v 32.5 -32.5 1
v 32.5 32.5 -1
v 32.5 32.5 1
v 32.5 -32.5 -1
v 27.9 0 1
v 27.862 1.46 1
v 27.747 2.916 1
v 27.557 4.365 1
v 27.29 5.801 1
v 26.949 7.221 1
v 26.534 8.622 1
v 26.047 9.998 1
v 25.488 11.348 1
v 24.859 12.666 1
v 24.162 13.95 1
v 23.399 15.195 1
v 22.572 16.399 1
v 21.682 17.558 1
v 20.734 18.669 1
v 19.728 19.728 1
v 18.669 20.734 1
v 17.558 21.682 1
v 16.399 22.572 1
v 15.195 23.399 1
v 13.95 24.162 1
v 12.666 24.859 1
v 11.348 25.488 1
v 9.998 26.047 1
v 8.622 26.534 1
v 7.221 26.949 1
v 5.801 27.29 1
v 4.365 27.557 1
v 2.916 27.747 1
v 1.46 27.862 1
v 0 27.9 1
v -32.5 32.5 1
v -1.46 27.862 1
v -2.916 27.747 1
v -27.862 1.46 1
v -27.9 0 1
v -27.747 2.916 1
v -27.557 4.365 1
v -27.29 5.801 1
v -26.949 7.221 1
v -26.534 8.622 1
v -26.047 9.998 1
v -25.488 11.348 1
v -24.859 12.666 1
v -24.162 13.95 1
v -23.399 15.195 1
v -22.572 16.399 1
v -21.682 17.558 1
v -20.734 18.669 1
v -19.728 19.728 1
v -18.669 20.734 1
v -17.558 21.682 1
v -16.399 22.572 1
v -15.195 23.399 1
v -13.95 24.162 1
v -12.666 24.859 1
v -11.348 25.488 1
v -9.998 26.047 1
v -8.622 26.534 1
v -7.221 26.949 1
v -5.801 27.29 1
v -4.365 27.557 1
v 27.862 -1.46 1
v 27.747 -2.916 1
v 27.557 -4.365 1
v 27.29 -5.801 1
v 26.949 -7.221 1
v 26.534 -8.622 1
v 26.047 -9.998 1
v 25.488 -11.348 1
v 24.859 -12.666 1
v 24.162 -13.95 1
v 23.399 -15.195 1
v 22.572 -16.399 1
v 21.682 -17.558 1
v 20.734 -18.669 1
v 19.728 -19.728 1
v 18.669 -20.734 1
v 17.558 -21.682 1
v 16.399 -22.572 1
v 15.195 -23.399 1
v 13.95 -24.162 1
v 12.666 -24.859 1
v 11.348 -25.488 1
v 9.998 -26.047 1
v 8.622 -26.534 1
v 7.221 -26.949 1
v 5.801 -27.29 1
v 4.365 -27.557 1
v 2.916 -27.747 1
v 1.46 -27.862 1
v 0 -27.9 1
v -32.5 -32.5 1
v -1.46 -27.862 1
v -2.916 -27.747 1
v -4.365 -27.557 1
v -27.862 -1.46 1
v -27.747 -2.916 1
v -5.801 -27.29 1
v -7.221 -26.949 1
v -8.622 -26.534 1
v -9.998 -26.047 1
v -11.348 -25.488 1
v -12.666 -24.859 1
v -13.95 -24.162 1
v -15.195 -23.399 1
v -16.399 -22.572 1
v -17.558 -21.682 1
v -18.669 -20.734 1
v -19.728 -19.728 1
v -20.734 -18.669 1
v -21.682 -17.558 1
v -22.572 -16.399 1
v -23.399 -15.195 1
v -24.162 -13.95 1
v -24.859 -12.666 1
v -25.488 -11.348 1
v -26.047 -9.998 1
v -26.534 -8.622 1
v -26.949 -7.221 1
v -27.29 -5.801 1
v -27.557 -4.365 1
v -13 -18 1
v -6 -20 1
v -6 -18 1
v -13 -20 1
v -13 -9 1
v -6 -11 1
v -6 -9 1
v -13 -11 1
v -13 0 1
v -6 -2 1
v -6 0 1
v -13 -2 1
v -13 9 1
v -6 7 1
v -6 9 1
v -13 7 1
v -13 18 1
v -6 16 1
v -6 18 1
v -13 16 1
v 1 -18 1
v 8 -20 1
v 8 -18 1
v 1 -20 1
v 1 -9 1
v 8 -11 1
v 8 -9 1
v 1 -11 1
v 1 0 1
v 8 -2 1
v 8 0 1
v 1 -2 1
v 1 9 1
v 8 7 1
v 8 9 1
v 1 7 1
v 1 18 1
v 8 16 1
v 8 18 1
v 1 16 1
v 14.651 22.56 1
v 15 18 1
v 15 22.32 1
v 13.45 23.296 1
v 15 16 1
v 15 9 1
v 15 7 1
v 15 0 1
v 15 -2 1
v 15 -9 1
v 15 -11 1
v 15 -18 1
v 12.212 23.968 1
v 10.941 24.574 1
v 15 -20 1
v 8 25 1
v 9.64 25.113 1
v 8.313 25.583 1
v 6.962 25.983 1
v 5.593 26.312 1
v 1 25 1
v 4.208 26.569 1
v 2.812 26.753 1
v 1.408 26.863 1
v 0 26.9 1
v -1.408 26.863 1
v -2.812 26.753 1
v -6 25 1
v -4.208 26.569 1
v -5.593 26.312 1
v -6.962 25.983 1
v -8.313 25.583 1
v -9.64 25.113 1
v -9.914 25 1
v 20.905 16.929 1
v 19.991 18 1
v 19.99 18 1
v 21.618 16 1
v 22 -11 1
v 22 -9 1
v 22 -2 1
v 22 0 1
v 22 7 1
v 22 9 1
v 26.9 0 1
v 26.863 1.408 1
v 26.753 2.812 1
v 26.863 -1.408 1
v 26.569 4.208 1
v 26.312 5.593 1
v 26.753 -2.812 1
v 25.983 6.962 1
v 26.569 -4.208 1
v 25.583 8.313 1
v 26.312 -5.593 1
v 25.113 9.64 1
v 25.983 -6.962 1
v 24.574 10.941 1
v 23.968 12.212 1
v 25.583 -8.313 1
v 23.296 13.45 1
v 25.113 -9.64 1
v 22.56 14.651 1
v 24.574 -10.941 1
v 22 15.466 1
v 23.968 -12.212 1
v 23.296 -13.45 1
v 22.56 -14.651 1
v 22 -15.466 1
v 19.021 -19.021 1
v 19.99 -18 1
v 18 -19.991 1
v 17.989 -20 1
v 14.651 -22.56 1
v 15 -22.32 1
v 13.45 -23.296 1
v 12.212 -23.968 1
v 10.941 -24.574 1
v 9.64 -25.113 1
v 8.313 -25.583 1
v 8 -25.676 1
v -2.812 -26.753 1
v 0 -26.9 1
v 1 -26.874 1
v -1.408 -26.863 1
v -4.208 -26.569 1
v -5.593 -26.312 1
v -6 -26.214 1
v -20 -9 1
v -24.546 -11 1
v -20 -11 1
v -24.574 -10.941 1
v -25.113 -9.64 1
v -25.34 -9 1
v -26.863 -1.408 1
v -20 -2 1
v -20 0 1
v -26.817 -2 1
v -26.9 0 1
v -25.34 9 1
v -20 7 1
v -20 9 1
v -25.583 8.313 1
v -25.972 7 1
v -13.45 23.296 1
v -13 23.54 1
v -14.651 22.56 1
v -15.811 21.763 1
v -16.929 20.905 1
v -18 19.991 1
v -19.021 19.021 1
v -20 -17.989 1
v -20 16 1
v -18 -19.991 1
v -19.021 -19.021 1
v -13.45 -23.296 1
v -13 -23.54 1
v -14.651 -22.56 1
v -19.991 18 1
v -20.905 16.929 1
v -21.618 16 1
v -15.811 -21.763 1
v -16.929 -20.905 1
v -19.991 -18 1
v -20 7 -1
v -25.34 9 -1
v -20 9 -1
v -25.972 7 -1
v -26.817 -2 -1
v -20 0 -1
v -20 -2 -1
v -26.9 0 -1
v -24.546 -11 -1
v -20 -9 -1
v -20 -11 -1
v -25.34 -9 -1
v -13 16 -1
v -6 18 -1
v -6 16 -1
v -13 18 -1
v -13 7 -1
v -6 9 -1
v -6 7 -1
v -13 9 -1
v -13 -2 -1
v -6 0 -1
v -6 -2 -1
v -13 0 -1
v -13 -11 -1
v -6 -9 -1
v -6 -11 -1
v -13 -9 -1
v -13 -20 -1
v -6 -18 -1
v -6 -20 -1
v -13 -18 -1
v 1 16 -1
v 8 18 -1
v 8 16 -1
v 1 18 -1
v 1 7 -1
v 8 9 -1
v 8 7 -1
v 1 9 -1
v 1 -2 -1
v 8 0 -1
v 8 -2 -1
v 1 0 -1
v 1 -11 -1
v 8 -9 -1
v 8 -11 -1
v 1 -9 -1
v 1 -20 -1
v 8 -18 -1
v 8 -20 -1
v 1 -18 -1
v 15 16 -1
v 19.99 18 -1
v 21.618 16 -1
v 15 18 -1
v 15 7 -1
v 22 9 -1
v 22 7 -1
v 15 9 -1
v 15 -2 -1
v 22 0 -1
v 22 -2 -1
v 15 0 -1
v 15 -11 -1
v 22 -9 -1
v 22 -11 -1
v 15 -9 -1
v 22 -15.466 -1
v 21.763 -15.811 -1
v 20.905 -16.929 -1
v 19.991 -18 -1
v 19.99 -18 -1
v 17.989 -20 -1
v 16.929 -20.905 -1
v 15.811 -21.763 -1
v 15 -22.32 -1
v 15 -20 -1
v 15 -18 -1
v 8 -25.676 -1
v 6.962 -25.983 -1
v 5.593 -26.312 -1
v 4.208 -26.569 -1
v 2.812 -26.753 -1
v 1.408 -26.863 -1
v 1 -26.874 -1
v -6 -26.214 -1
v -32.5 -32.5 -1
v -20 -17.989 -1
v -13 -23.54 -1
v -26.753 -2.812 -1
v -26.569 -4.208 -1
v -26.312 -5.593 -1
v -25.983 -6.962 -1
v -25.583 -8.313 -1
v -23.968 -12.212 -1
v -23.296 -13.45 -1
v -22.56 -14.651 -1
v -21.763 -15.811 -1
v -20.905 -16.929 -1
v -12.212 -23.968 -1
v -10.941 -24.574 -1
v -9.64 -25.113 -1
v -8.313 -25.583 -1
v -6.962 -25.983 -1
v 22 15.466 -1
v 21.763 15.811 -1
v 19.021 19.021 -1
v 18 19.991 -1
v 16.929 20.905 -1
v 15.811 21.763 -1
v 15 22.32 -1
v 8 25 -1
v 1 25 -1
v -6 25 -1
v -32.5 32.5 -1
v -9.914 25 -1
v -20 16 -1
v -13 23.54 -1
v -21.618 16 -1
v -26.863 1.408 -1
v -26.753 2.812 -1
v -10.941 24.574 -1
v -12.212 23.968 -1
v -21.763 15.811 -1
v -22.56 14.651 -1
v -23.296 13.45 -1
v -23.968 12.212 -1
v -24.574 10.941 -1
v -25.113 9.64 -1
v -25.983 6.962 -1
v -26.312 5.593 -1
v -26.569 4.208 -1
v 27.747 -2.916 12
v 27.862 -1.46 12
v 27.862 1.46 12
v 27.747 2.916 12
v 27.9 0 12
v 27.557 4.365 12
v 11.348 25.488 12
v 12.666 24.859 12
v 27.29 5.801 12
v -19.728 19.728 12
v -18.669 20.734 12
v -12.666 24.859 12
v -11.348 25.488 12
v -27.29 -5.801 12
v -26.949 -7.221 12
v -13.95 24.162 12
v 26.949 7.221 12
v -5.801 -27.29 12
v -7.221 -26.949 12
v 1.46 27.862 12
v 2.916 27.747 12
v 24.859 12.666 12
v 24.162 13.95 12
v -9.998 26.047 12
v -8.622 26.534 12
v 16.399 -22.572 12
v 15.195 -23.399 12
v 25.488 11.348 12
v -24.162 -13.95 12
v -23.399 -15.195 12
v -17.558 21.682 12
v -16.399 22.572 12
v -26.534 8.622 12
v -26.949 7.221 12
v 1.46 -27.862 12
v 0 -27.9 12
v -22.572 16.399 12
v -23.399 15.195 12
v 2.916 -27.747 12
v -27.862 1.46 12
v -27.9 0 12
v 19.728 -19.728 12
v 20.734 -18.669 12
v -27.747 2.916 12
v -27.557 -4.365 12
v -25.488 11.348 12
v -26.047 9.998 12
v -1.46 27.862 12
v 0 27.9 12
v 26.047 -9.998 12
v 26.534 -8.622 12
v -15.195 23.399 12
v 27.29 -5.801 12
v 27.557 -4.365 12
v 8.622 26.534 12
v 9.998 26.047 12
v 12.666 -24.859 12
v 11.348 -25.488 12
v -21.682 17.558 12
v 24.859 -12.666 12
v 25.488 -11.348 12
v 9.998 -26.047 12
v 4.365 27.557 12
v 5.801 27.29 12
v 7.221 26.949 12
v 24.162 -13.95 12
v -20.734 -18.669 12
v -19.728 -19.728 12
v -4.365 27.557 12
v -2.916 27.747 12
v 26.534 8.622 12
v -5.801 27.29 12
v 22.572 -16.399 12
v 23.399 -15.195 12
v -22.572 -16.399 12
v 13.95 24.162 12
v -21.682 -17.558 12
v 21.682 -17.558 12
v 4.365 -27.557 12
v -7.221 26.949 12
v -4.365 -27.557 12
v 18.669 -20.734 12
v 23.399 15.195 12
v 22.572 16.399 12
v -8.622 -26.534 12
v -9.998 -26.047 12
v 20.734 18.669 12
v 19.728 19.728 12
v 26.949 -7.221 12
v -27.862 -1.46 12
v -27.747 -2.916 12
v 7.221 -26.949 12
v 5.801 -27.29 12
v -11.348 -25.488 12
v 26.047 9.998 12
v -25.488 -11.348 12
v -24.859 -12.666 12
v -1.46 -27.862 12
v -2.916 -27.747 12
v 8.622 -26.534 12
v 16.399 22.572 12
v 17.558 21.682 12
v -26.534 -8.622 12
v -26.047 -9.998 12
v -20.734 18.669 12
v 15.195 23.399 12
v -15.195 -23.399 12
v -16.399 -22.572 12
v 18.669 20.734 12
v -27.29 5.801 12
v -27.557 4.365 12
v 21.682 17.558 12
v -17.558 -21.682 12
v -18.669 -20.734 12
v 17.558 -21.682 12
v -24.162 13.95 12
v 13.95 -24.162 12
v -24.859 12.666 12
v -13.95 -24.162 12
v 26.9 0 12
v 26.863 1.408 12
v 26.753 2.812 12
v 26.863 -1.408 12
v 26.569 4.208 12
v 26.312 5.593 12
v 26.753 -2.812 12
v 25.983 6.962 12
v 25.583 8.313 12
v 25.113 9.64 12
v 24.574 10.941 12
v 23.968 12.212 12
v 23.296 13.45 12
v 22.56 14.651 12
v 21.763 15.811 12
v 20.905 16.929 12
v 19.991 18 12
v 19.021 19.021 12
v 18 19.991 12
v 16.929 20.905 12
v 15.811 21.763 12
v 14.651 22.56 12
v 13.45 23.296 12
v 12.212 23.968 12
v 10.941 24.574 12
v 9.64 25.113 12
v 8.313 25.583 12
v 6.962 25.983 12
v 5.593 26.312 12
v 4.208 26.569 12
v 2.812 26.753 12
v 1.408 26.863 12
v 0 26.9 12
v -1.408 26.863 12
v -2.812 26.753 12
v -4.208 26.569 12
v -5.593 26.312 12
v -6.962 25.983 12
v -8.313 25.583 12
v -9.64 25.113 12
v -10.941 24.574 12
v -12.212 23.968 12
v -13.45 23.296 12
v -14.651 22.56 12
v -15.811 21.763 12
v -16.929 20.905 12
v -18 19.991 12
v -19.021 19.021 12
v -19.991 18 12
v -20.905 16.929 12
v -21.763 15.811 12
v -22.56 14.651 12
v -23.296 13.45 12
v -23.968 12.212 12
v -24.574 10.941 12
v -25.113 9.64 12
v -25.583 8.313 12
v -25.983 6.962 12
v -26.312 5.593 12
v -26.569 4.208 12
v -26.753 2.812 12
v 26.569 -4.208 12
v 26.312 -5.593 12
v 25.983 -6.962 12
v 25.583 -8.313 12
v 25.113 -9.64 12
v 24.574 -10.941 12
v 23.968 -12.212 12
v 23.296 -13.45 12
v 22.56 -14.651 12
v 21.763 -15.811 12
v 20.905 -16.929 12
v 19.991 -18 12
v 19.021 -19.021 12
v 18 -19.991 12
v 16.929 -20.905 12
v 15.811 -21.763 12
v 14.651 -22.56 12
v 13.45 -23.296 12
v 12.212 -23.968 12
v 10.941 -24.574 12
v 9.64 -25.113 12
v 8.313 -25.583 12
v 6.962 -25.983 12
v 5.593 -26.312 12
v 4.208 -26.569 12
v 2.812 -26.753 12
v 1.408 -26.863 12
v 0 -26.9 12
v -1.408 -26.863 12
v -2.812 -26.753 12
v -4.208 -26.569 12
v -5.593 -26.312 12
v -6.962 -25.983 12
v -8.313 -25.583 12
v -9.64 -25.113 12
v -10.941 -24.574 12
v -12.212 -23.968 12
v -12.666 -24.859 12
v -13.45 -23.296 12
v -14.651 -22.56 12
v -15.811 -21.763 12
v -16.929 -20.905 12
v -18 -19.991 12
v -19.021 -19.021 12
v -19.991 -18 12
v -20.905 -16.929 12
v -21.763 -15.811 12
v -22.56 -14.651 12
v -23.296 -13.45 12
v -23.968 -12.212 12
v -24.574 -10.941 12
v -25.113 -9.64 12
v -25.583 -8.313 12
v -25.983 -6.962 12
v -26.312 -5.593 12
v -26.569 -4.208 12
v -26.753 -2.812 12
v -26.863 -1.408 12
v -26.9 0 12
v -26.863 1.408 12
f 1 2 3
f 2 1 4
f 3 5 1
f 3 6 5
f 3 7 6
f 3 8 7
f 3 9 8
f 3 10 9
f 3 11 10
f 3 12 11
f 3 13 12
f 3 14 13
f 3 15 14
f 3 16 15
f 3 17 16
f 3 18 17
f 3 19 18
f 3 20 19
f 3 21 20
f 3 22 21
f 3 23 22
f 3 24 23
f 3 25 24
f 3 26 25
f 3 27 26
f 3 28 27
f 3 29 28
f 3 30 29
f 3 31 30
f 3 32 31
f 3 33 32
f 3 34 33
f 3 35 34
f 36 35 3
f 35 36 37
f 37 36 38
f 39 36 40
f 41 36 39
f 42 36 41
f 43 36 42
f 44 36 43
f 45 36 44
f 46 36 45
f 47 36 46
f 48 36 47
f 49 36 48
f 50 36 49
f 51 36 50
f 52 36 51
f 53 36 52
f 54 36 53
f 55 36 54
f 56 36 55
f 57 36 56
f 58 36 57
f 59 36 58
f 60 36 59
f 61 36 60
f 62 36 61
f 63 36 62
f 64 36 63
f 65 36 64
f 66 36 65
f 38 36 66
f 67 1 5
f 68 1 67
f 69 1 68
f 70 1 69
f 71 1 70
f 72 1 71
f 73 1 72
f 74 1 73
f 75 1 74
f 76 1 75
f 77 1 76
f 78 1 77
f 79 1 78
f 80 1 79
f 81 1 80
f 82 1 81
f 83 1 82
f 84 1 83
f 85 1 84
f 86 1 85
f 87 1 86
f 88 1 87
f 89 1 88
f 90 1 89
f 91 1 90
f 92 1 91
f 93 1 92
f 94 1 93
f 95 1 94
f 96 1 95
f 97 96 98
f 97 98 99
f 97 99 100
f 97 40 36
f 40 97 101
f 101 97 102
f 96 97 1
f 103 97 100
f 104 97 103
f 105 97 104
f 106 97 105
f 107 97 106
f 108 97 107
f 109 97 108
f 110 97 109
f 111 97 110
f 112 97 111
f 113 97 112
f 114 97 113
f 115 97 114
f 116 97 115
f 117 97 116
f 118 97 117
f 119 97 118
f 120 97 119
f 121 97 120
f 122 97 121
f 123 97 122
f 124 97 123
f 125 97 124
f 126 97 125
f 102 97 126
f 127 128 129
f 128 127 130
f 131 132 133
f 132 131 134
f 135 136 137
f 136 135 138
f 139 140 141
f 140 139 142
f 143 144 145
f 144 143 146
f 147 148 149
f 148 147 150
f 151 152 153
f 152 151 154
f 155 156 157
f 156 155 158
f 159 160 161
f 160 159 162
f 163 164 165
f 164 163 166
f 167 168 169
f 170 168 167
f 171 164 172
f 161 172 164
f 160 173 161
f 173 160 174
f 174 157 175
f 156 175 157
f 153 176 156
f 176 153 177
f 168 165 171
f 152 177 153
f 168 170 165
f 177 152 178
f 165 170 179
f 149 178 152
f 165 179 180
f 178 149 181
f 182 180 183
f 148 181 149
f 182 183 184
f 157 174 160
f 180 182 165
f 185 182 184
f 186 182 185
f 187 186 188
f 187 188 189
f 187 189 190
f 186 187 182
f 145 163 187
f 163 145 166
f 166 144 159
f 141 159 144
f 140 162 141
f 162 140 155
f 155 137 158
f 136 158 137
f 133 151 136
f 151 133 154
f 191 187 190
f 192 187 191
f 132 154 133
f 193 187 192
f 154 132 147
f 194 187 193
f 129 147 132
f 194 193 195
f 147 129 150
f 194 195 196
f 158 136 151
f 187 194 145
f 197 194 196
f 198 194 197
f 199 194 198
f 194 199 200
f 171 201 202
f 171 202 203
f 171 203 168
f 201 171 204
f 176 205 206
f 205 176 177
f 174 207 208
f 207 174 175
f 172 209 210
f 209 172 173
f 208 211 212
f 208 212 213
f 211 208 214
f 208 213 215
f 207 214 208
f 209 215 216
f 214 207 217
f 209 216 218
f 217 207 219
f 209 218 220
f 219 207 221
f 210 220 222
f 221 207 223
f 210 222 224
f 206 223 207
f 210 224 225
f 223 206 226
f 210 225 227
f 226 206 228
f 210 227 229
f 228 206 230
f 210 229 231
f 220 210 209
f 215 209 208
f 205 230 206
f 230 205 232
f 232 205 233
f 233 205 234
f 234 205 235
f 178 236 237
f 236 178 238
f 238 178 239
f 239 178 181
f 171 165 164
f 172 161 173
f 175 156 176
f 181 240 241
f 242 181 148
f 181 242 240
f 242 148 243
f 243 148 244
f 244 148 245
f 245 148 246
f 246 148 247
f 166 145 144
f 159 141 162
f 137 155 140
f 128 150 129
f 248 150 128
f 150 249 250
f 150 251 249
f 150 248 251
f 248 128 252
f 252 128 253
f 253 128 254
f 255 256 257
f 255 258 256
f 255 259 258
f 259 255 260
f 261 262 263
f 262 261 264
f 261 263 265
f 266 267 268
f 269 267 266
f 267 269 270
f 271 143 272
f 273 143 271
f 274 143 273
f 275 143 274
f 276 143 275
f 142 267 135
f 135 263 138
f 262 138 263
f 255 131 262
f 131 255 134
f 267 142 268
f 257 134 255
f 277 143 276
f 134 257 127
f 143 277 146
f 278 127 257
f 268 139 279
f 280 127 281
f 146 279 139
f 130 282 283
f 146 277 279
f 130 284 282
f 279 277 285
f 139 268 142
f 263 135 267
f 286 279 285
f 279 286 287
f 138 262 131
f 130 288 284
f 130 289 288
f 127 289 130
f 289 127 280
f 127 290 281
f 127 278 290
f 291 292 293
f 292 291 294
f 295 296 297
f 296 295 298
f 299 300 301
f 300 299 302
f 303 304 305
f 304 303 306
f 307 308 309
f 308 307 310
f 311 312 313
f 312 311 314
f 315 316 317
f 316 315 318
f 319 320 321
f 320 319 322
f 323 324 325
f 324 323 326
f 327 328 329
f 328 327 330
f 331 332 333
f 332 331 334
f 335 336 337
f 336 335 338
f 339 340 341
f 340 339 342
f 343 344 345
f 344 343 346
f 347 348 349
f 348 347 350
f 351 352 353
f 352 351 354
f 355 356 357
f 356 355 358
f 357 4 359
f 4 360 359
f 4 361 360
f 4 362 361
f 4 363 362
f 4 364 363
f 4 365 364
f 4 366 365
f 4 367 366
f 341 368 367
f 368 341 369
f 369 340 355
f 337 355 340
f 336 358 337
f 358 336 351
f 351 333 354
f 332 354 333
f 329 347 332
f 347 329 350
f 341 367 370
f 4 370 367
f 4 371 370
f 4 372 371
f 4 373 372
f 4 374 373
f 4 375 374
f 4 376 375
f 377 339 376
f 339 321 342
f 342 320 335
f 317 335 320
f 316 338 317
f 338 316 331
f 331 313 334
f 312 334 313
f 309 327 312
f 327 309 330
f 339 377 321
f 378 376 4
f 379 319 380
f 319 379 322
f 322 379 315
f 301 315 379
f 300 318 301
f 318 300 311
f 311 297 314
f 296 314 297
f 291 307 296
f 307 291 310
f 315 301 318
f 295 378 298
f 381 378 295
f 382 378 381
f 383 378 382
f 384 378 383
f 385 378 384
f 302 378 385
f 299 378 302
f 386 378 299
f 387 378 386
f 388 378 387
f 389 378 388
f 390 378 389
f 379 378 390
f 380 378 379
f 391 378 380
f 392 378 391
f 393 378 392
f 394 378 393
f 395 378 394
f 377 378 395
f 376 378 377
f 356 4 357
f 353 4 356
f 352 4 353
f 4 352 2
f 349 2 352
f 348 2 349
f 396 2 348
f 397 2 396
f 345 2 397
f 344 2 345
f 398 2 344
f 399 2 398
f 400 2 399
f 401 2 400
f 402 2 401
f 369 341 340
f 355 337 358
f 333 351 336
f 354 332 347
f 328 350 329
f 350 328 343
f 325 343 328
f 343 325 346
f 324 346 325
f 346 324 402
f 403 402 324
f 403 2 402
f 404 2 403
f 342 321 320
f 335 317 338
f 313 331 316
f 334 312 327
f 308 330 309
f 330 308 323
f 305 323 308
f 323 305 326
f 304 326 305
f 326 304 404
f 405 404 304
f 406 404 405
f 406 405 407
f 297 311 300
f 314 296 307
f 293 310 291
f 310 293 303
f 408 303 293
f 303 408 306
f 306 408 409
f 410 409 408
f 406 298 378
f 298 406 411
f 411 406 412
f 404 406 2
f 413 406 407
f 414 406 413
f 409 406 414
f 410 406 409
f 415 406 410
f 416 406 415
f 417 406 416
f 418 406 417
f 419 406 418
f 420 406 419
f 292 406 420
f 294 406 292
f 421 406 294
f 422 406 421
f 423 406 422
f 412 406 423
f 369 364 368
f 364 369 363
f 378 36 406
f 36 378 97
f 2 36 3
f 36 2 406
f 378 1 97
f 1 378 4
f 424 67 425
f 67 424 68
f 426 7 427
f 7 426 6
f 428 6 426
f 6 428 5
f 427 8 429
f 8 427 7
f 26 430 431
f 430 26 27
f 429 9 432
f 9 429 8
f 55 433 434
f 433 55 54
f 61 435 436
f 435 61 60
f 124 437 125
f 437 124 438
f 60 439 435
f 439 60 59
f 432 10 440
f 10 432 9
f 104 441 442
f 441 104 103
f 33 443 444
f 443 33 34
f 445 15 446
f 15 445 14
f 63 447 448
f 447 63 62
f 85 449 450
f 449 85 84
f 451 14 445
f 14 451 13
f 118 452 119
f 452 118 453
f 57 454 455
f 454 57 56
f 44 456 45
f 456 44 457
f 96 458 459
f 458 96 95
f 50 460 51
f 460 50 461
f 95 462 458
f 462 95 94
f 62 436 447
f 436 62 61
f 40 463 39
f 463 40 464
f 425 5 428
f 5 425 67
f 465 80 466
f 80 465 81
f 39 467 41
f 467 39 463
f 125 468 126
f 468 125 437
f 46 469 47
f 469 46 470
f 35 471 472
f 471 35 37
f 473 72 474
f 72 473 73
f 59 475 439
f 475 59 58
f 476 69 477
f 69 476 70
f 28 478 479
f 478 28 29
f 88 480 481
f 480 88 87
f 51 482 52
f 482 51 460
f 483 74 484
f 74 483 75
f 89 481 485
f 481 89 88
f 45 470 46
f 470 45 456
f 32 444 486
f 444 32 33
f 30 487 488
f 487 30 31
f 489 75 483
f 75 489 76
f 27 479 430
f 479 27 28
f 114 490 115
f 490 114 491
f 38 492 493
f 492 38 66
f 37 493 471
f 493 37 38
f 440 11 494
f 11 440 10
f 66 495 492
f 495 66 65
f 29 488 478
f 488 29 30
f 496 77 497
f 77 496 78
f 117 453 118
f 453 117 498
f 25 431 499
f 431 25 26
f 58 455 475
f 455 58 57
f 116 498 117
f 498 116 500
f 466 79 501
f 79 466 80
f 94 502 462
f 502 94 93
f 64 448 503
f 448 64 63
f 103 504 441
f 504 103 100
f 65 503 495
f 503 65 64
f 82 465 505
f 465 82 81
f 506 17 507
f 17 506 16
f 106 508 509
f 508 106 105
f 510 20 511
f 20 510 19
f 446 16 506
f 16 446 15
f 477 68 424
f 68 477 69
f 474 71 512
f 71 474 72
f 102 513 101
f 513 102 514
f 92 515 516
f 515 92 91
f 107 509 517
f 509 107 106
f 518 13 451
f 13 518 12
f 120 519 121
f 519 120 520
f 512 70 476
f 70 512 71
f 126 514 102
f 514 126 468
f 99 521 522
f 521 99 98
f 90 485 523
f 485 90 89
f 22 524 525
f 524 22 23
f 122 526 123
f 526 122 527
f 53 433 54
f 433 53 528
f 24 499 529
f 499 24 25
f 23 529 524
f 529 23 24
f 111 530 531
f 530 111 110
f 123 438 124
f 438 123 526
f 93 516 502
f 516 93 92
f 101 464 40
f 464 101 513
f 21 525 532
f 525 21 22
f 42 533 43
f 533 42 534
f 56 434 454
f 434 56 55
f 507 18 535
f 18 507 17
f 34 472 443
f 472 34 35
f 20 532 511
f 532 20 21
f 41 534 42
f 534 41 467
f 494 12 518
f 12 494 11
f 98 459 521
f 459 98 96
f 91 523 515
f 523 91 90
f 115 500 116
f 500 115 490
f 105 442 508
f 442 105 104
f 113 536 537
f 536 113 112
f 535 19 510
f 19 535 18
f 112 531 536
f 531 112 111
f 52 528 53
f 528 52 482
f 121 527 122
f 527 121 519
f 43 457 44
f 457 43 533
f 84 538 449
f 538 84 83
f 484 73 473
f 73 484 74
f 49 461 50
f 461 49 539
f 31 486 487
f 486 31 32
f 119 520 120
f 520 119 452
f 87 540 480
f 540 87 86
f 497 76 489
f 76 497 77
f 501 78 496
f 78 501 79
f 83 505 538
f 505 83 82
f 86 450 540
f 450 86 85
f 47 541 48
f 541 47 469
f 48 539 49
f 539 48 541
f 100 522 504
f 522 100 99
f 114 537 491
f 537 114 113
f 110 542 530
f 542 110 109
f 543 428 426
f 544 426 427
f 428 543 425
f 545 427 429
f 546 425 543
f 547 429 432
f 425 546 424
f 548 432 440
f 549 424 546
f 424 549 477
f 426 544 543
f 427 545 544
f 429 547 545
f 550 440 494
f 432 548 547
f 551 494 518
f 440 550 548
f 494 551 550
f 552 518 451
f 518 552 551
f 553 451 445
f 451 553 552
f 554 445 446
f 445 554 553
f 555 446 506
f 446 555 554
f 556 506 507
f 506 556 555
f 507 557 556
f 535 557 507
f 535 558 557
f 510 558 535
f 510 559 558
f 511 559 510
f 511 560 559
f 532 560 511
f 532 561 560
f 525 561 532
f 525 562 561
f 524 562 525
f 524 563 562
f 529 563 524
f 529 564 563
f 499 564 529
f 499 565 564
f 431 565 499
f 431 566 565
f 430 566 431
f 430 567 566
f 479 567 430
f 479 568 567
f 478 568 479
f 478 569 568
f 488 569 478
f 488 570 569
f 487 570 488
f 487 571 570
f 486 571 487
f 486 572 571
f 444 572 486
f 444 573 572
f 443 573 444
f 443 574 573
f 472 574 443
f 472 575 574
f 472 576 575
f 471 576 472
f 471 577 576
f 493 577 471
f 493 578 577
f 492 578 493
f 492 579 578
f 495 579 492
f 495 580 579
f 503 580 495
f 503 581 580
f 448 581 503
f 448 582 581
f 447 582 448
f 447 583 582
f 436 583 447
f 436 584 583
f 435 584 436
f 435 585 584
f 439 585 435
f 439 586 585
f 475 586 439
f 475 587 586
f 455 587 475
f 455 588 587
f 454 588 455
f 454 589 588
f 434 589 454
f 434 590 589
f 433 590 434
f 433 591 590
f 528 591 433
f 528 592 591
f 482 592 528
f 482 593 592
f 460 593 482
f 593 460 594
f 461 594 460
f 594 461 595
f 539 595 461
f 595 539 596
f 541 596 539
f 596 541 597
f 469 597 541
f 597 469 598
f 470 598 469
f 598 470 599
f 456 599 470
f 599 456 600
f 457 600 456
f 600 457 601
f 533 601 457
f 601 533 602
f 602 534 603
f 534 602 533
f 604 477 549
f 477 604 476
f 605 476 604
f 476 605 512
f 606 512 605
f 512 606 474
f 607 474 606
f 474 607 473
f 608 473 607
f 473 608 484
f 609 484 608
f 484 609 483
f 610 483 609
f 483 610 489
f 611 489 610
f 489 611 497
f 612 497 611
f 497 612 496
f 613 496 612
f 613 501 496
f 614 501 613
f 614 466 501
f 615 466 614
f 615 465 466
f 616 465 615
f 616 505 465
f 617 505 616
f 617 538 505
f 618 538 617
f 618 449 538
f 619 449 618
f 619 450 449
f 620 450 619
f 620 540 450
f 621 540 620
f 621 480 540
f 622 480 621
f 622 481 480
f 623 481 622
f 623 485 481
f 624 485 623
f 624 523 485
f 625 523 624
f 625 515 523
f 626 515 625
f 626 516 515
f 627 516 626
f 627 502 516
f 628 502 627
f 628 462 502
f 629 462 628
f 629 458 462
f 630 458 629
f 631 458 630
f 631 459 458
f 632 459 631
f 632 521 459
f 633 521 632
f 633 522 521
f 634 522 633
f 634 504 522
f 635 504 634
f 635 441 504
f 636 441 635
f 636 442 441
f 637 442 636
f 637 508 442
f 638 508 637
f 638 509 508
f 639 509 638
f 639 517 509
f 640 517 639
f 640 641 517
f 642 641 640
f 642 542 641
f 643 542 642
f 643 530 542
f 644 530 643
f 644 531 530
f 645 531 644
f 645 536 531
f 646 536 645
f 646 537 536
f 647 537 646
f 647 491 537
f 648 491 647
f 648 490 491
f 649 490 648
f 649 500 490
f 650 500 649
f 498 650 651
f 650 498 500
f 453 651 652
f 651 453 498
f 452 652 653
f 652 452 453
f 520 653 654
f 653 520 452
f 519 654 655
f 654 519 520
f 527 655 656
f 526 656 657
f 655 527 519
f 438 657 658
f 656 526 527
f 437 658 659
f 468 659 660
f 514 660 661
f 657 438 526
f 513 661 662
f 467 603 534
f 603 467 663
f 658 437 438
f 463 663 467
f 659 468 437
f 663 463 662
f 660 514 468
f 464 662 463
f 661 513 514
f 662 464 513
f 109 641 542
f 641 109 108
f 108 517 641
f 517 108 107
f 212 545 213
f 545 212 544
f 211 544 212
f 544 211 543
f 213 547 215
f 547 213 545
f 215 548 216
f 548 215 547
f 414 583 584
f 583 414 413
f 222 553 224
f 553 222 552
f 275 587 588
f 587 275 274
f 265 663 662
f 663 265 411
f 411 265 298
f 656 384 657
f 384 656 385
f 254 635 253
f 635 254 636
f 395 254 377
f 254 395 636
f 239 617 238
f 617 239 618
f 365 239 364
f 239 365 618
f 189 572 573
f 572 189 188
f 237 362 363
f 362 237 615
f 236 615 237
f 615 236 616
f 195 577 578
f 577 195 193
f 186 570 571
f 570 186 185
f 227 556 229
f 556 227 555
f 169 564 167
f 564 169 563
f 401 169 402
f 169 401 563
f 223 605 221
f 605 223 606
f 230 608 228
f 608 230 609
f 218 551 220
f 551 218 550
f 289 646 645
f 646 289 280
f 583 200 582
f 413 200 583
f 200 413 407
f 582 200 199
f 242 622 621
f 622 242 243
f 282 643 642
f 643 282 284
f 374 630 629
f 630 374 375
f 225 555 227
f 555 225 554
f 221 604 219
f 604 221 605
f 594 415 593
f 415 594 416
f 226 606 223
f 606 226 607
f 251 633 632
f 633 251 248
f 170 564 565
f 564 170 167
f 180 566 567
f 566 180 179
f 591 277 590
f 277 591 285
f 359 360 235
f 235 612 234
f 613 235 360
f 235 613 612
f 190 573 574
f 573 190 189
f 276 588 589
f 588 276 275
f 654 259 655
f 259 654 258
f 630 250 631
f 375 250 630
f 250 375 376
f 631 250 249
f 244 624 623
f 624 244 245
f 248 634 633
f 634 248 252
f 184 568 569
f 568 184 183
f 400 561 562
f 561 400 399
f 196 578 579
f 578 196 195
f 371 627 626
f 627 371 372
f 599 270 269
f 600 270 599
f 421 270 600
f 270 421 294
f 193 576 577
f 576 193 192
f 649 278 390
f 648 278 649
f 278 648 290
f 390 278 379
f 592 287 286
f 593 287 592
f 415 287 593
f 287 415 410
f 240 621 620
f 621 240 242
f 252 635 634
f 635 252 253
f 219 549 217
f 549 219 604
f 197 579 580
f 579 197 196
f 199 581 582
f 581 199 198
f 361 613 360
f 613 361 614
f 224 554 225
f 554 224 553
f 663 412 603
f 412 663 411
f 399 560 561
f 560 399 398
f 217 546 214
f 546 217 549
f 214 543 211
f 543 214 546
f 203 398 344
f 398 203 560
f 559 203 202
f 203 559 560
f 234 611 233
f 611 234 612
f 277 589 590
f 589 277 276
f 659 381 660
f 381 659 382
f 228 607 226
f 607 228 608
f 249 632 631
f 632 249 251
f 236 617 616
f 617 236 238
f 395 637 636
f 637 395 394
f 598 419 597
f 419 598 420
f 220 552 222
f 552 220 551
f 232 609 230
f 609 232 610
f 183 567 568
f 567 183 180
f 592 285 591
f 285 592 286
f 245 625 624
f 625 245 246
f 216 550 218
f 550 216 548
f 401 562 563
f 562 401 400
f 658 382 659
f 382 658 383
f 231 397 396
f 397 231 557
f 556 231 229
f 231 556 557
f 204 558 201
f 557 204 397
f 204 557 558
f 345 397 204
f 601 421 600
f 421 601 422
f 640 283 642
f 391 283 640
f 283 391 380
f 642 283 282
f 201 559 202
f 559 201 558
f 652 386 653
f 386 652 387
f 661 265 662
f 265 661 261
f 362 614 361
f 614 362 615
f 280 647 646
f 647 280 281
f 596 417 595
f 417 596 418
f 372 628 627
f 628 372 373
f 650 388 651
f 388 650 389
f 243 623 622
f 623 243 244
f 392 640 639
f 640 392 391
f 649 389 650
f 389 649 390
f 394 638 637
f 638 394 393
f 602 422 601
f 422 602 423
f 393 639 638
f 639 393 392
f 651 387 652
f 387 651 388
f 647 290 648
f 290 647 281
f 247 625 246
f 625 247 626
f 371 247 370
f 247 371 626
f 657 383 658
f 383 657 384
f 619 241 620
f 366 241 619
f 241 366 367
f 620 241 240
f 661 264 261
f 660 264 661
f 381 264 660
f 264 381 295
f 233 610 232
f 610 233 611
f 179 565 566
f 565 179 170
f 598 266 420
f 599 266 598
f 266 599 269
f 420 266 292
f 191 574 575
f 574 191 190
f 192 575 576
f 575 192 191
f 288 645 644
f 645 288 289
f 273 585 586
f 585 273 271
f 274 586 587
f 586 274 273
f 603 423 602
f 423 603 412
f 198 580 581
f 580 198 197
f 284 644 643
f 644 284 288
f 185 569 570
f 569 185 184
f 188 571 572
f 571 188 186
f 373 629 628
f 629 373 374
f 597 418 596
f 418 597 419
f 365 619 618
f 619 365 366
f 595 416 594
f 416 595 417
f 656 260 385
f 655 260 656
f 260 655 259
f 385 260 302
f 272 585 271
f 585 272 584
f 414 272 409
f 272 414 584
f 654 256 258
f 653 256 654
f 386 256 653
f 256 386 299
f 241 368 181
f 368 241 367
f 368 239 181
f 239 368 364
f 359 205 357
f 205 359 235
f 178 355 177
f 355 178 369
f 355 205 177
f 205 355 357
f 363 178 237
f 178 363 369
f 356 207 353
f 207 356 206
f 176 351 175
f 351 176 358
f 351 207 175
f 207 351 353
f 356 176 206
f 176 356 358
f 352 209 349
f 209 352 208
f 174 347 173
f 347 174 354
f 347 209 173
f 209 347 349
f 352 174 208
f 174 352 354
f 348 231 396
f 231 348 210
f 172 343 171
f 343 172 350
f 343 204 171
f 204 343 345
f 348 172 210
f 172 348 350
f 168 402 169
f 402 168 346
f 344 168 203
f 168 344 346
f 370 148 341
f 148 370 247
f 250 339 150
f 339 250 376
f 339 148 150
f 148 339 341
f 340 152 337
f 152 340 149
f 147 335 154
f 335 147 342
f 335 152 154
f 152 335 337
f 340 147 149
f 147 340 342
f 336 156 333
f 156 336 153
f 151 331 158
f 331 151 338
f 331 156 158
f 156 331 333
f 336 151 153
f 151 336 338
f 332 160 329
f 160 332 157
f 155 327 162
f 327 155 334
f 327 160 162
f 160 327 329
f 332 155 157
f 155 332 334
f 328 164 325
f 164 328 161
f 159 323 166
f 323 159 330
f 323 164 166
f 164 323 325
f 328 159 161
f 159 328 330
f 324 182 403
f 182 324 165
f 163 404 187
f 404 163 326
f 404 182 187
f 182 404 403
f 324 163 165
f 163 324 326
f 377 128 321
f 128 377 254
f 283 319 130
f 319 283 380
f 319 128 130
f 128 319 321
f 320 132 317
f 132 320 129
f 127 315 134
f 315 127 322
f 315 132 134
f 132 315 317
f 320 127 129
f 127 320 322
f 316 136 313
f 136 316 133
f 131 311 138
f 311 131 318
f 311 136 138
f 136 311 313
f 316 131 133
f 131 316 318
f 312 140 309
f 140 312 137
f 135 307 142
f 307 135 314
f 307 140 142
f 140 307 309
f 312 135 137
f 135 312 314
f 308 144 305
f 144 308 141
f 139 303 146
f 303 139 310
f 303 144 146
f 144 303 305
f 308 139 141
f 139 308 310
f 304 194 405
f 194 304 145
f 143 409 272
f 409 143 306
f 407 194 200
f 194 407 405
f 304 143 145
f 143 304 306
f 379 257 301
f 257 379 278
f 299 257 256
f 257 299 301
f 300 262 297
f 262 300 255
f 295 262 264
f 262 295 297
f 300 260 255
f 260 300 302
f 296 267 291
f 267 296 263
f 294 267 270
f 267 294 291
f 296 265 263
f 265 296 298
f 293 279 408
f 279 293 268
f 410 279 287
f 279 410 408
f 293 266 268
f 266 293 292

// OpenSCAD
dicke_size=2;
size=65;
d=53.8;
r=d/2;
$fn=120;
module zylinder1()     {
 cylinder(h = 12, r1 = r+1, r2 = r+1, center = false);   }   
module zylinder2(){
   cylinder(h = 60, r1 = r, r2 = r, center = true);     } 
module schleuse() {
    cube([size, size, dicke_size], center=true);
    translate([size/2,0,0]);}
    
module loch(s) {
    cube([s, s, dicke_size], center=true);}
module loescher(s=7){
  for(x = [size/2 : -2*s: -size/2]) {
    for(y = [-size/2 : s+2: size/2]){
      translate([x,y,0]) loch(s);}    }} 
  
module A() {
module hut() {
schleuse();
zylinder1();
}
difference (){
    hut();
    zylinder2();
}}
// main
A();
difference (){
schleuse();
loescher();}
